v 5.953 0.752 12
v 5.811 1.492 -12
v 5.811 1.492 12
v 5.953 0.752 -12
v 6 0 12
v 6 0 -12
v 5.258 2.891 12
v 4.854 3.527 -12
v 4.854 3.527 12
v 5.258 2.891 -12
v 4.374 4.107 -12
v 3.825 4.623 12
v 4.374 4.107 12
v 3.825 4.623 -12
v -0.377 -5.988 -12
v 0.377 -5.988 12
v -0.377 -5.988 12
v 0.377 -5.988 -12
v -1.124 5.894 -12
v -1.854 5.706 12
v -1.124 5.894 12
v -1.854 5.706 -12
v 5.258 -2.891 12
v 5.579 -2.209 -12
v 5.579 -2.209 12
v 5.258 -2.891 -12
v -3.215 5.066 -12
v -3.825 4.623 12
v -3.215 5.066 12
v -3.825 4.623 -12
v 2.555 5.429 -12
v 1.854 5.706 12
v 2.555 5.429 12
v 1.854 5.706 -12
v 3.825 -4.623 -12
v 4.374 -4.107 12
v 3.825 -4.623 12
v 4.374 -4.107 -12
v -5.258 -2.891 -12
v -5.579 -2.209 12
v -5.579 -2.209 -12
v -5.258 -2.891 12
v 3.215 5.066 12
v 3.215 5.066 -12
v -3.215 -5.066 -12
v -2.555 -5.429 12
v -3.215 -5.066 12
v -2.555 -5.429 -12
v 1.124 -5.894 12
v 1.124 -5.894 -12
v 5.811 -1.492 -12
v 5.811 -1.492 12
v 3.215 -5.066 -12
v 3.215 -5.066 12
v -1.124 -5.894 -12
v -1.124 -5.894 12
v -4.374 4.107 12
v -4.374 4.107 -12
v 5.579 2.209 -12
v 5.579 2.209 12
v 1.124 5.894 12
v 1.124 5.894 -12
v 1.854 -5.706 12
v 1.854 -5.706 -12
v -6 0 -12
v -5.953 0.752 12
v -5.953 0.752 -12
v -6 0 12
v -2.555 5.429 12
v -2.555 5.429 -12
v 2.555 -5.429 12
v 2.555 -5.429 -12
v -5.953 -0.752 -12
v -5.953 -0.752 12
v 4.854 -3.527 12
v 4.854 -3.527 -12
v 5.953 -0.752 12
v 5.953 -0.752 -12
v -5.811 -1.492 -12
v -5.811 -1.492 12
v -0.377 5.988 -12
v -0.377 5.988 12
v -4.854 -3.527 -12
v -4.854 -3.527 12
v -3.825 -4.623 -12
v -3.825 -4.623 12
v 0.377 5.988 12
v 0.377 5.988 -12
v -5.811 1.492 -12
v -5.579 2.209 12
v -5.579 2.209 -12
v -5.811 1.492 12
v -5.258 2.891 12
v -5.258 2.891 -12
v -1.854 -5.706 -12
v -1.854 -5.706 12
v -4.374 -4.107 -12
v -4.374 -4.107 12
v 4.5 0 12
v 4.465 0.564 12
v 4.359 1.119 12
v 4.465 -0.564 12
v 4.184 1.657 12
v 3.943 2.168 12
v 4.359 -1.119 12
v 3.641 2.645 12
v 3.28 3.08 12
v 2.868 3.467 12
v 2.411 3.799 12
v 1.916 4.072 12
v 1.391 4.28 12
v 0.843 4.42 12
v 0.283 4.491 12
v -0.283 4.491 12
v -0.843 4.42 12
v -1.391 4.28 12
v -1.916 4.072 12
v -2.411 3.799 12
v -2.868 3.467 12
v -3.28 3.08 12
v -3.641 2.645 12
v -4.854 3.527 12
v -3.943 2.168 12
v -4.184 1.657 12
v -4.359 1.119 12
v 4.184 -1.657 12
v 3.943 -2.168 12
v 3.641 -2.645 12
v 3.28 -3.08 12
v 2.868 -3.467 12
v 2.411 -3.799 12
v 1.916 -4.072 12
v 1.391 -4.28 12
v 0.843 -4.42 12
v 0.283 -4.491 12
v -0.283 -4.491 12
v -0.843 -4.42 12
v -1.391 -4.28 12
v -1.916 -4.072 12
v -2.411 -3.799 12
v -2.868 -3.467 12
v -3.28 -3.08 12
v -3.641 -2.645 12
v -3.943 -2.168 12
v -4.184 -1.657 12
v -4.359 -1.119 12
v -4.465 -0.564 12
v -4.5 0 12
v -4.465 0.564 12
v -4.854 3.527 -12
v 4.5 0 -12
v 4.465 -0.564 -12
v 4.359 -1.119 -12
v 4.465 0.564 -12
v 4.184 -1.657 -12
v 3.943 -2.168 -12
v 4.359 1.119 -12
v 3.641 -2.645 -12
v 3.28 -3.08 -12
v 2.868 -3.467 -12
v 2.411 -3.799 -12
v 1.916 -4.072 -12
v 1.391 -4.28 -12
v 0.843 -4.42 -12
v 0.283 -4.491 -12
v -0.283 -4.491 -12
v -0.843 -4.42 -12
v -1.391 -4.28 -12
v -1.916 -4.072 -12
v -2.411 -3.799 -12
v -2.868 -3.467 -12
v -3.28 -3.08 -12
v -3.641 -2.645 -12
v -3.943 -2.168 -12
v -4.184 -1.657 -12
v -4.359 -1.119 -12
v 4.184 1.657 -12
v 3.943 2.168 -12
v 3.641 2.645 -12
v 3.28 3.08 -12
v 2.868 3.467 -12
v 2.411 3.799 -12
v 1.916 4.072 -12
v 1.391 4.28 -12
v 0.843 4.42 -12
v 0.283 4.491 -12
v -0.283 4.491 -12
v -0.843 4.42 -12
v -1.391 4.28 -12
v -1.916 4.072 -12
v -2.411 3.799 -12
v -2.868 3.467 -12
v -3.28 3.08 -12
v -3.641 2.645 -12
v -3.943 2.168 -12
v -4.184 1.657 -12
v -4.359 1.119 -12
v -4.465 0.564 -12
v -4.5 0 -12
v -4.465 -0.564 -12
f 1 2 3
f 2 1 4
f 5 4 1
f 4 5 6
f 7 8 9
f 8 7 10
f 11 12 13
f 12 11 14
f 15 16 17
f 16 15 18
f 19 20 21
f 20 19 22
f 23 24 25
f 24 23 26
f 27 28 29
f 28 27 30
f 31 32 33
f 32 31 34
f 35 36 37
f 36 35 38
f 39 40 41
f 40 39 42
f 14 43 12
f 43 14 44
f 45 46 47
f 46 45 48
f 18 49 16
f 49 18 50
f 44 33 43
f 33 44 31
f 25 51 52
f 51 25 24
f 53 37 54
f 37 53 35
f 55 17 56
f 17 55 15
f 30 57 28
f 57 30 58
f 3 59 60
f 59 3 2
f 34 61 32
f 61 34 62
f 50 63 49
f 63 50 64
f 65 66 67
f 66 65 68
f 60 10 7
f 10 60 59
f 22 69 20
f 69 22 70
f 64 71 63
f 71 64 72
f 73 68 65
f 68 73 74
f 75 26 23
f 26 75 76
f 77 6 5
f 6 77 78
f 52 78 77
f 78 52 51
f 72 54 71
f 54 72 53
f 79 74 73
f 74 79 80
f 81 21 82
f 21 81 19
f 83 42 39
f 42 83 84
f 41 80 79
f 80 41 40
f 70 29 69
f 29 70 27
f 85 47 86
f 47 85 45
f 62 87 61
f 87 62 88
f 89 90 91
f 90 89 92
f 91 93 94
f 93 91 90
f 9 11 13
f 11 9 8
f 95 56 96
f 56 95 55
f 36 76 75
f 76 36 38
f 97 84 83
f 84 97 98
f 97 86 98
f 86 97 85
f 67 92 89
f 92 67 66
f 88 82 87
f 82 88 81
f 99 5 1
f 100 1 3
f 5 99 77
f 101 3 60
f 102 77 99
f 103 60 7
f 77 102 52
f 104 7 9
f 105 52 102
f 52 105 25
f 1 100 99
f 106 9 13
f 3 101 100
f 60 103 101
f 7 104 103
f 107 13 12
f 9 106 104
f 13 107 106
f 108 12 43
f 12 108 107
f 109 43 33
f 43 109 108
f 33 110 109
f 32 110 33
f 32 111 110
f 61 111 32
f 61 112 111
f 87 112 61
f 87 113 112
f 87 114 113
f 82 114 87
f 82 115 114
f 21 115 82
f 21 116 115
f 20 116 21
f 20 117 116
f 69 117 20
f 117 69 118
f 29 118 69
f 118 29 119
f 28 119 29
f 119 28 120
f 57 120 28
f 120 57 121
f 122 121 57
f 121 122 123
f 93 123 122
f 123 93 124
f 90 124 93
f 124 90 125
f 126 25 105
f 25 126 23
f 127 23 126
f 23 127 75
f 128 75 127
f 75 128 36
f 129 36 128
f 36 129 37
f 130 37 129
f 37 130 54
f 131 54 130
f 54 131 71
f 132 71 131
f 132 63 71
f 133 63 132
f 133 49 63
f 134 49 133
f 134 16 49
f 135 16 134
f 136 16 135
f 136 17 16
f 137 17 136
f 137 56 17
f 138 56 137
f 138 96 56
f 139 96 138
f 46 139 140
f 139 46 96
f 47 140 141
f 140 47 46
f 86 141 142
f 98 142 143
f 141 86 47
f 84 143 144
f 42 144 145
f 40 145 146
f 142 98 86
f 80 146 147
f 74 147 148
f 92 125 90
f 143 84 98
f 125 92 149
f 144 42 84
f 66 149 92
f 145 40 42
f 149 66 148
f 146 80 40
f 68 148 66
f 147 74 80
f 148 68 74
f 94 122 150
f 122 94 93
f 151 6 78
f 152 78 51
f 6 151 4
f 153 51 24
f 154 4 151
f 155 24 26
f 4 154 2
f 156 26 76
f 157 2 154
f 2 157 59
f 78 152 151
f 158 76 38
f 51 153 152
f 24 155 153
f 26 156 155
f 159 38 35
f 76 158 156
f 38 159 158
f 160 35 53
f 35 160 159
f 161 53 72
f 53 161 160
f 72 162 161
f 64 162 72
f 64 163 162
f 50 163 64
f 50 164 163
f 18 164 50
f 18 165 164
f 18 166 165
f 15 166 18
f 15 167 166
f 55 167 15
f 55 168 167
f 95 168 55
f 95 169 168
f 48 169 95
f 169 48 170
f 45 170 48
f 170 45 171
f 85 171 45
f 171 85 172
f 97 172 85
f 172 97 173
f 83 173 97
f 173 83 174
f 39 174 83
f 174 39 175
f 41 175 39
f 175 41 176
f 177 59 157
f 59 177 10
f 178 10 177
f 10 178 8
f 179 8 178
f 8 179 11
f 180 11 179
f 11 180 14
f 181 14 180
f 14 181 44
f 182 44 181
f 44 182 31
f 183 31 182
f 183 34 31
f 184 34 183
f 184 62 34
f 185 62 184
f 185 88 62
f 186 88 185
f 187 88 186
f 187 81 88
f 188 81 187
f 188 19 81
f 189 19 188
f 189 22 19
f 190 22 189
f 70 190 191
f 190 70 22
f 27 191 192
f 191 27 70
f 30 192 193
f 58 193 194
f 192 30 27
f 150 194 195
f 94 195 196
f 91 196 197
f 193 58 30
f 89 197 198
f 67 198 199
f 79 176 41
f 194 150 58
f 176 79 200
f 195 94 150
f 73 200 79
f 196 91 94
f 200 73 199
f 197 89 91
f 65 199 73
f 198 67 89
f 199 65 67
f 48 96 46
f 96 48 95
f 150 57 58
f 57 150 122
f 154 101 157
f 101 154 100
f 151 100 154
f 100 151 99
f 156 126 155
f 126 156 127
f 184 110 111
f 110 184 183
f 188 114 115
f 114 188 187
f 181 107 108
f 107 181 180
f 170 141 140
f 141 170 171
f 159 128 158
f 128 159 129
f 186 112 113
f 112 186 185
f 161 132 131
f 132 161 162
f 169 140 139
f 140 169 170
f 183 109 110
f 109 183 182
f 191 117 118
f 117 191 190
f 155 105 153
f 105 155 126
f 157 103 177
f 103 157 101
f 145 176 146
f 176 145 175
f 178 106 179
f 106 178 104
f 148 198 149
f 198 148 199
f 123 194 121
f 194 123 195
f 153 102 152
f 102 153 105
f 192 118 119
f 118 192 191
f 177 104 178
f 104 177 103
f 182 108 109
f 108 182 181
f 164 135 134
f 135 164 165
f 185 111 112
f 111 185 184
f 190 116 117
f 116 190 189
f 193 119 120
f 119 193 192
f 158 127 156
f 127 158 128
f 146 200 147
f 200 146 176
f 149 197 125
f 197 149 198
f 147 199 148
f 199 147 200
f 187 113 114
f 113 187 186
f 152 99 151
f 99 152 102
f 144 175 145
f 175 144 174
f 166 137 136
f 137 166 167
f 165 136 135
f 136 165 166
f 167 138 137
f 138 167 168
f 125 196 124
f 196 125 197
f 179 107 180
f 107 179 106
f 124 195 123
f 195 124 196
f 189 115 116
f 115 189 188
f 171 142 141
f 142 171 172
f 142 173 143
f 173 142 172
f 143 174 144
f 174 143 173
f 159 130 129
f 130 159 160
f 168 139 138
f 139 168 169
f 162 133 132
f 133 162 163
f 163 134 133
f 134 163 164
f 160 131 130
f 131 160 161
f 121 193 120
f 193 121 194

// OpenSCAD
$fn = 50;


difference() {
	union() {
		translate(v = [0, 0, -12.0000000000]) {
			cylinder(h = 24, r = 6.0000000000);
		}
	}
	union() {
		translate(v = [0, 0, -100.0000000000]) {
			cylinder(h = 200, r = 4.5000000000);
		}
	}
}
